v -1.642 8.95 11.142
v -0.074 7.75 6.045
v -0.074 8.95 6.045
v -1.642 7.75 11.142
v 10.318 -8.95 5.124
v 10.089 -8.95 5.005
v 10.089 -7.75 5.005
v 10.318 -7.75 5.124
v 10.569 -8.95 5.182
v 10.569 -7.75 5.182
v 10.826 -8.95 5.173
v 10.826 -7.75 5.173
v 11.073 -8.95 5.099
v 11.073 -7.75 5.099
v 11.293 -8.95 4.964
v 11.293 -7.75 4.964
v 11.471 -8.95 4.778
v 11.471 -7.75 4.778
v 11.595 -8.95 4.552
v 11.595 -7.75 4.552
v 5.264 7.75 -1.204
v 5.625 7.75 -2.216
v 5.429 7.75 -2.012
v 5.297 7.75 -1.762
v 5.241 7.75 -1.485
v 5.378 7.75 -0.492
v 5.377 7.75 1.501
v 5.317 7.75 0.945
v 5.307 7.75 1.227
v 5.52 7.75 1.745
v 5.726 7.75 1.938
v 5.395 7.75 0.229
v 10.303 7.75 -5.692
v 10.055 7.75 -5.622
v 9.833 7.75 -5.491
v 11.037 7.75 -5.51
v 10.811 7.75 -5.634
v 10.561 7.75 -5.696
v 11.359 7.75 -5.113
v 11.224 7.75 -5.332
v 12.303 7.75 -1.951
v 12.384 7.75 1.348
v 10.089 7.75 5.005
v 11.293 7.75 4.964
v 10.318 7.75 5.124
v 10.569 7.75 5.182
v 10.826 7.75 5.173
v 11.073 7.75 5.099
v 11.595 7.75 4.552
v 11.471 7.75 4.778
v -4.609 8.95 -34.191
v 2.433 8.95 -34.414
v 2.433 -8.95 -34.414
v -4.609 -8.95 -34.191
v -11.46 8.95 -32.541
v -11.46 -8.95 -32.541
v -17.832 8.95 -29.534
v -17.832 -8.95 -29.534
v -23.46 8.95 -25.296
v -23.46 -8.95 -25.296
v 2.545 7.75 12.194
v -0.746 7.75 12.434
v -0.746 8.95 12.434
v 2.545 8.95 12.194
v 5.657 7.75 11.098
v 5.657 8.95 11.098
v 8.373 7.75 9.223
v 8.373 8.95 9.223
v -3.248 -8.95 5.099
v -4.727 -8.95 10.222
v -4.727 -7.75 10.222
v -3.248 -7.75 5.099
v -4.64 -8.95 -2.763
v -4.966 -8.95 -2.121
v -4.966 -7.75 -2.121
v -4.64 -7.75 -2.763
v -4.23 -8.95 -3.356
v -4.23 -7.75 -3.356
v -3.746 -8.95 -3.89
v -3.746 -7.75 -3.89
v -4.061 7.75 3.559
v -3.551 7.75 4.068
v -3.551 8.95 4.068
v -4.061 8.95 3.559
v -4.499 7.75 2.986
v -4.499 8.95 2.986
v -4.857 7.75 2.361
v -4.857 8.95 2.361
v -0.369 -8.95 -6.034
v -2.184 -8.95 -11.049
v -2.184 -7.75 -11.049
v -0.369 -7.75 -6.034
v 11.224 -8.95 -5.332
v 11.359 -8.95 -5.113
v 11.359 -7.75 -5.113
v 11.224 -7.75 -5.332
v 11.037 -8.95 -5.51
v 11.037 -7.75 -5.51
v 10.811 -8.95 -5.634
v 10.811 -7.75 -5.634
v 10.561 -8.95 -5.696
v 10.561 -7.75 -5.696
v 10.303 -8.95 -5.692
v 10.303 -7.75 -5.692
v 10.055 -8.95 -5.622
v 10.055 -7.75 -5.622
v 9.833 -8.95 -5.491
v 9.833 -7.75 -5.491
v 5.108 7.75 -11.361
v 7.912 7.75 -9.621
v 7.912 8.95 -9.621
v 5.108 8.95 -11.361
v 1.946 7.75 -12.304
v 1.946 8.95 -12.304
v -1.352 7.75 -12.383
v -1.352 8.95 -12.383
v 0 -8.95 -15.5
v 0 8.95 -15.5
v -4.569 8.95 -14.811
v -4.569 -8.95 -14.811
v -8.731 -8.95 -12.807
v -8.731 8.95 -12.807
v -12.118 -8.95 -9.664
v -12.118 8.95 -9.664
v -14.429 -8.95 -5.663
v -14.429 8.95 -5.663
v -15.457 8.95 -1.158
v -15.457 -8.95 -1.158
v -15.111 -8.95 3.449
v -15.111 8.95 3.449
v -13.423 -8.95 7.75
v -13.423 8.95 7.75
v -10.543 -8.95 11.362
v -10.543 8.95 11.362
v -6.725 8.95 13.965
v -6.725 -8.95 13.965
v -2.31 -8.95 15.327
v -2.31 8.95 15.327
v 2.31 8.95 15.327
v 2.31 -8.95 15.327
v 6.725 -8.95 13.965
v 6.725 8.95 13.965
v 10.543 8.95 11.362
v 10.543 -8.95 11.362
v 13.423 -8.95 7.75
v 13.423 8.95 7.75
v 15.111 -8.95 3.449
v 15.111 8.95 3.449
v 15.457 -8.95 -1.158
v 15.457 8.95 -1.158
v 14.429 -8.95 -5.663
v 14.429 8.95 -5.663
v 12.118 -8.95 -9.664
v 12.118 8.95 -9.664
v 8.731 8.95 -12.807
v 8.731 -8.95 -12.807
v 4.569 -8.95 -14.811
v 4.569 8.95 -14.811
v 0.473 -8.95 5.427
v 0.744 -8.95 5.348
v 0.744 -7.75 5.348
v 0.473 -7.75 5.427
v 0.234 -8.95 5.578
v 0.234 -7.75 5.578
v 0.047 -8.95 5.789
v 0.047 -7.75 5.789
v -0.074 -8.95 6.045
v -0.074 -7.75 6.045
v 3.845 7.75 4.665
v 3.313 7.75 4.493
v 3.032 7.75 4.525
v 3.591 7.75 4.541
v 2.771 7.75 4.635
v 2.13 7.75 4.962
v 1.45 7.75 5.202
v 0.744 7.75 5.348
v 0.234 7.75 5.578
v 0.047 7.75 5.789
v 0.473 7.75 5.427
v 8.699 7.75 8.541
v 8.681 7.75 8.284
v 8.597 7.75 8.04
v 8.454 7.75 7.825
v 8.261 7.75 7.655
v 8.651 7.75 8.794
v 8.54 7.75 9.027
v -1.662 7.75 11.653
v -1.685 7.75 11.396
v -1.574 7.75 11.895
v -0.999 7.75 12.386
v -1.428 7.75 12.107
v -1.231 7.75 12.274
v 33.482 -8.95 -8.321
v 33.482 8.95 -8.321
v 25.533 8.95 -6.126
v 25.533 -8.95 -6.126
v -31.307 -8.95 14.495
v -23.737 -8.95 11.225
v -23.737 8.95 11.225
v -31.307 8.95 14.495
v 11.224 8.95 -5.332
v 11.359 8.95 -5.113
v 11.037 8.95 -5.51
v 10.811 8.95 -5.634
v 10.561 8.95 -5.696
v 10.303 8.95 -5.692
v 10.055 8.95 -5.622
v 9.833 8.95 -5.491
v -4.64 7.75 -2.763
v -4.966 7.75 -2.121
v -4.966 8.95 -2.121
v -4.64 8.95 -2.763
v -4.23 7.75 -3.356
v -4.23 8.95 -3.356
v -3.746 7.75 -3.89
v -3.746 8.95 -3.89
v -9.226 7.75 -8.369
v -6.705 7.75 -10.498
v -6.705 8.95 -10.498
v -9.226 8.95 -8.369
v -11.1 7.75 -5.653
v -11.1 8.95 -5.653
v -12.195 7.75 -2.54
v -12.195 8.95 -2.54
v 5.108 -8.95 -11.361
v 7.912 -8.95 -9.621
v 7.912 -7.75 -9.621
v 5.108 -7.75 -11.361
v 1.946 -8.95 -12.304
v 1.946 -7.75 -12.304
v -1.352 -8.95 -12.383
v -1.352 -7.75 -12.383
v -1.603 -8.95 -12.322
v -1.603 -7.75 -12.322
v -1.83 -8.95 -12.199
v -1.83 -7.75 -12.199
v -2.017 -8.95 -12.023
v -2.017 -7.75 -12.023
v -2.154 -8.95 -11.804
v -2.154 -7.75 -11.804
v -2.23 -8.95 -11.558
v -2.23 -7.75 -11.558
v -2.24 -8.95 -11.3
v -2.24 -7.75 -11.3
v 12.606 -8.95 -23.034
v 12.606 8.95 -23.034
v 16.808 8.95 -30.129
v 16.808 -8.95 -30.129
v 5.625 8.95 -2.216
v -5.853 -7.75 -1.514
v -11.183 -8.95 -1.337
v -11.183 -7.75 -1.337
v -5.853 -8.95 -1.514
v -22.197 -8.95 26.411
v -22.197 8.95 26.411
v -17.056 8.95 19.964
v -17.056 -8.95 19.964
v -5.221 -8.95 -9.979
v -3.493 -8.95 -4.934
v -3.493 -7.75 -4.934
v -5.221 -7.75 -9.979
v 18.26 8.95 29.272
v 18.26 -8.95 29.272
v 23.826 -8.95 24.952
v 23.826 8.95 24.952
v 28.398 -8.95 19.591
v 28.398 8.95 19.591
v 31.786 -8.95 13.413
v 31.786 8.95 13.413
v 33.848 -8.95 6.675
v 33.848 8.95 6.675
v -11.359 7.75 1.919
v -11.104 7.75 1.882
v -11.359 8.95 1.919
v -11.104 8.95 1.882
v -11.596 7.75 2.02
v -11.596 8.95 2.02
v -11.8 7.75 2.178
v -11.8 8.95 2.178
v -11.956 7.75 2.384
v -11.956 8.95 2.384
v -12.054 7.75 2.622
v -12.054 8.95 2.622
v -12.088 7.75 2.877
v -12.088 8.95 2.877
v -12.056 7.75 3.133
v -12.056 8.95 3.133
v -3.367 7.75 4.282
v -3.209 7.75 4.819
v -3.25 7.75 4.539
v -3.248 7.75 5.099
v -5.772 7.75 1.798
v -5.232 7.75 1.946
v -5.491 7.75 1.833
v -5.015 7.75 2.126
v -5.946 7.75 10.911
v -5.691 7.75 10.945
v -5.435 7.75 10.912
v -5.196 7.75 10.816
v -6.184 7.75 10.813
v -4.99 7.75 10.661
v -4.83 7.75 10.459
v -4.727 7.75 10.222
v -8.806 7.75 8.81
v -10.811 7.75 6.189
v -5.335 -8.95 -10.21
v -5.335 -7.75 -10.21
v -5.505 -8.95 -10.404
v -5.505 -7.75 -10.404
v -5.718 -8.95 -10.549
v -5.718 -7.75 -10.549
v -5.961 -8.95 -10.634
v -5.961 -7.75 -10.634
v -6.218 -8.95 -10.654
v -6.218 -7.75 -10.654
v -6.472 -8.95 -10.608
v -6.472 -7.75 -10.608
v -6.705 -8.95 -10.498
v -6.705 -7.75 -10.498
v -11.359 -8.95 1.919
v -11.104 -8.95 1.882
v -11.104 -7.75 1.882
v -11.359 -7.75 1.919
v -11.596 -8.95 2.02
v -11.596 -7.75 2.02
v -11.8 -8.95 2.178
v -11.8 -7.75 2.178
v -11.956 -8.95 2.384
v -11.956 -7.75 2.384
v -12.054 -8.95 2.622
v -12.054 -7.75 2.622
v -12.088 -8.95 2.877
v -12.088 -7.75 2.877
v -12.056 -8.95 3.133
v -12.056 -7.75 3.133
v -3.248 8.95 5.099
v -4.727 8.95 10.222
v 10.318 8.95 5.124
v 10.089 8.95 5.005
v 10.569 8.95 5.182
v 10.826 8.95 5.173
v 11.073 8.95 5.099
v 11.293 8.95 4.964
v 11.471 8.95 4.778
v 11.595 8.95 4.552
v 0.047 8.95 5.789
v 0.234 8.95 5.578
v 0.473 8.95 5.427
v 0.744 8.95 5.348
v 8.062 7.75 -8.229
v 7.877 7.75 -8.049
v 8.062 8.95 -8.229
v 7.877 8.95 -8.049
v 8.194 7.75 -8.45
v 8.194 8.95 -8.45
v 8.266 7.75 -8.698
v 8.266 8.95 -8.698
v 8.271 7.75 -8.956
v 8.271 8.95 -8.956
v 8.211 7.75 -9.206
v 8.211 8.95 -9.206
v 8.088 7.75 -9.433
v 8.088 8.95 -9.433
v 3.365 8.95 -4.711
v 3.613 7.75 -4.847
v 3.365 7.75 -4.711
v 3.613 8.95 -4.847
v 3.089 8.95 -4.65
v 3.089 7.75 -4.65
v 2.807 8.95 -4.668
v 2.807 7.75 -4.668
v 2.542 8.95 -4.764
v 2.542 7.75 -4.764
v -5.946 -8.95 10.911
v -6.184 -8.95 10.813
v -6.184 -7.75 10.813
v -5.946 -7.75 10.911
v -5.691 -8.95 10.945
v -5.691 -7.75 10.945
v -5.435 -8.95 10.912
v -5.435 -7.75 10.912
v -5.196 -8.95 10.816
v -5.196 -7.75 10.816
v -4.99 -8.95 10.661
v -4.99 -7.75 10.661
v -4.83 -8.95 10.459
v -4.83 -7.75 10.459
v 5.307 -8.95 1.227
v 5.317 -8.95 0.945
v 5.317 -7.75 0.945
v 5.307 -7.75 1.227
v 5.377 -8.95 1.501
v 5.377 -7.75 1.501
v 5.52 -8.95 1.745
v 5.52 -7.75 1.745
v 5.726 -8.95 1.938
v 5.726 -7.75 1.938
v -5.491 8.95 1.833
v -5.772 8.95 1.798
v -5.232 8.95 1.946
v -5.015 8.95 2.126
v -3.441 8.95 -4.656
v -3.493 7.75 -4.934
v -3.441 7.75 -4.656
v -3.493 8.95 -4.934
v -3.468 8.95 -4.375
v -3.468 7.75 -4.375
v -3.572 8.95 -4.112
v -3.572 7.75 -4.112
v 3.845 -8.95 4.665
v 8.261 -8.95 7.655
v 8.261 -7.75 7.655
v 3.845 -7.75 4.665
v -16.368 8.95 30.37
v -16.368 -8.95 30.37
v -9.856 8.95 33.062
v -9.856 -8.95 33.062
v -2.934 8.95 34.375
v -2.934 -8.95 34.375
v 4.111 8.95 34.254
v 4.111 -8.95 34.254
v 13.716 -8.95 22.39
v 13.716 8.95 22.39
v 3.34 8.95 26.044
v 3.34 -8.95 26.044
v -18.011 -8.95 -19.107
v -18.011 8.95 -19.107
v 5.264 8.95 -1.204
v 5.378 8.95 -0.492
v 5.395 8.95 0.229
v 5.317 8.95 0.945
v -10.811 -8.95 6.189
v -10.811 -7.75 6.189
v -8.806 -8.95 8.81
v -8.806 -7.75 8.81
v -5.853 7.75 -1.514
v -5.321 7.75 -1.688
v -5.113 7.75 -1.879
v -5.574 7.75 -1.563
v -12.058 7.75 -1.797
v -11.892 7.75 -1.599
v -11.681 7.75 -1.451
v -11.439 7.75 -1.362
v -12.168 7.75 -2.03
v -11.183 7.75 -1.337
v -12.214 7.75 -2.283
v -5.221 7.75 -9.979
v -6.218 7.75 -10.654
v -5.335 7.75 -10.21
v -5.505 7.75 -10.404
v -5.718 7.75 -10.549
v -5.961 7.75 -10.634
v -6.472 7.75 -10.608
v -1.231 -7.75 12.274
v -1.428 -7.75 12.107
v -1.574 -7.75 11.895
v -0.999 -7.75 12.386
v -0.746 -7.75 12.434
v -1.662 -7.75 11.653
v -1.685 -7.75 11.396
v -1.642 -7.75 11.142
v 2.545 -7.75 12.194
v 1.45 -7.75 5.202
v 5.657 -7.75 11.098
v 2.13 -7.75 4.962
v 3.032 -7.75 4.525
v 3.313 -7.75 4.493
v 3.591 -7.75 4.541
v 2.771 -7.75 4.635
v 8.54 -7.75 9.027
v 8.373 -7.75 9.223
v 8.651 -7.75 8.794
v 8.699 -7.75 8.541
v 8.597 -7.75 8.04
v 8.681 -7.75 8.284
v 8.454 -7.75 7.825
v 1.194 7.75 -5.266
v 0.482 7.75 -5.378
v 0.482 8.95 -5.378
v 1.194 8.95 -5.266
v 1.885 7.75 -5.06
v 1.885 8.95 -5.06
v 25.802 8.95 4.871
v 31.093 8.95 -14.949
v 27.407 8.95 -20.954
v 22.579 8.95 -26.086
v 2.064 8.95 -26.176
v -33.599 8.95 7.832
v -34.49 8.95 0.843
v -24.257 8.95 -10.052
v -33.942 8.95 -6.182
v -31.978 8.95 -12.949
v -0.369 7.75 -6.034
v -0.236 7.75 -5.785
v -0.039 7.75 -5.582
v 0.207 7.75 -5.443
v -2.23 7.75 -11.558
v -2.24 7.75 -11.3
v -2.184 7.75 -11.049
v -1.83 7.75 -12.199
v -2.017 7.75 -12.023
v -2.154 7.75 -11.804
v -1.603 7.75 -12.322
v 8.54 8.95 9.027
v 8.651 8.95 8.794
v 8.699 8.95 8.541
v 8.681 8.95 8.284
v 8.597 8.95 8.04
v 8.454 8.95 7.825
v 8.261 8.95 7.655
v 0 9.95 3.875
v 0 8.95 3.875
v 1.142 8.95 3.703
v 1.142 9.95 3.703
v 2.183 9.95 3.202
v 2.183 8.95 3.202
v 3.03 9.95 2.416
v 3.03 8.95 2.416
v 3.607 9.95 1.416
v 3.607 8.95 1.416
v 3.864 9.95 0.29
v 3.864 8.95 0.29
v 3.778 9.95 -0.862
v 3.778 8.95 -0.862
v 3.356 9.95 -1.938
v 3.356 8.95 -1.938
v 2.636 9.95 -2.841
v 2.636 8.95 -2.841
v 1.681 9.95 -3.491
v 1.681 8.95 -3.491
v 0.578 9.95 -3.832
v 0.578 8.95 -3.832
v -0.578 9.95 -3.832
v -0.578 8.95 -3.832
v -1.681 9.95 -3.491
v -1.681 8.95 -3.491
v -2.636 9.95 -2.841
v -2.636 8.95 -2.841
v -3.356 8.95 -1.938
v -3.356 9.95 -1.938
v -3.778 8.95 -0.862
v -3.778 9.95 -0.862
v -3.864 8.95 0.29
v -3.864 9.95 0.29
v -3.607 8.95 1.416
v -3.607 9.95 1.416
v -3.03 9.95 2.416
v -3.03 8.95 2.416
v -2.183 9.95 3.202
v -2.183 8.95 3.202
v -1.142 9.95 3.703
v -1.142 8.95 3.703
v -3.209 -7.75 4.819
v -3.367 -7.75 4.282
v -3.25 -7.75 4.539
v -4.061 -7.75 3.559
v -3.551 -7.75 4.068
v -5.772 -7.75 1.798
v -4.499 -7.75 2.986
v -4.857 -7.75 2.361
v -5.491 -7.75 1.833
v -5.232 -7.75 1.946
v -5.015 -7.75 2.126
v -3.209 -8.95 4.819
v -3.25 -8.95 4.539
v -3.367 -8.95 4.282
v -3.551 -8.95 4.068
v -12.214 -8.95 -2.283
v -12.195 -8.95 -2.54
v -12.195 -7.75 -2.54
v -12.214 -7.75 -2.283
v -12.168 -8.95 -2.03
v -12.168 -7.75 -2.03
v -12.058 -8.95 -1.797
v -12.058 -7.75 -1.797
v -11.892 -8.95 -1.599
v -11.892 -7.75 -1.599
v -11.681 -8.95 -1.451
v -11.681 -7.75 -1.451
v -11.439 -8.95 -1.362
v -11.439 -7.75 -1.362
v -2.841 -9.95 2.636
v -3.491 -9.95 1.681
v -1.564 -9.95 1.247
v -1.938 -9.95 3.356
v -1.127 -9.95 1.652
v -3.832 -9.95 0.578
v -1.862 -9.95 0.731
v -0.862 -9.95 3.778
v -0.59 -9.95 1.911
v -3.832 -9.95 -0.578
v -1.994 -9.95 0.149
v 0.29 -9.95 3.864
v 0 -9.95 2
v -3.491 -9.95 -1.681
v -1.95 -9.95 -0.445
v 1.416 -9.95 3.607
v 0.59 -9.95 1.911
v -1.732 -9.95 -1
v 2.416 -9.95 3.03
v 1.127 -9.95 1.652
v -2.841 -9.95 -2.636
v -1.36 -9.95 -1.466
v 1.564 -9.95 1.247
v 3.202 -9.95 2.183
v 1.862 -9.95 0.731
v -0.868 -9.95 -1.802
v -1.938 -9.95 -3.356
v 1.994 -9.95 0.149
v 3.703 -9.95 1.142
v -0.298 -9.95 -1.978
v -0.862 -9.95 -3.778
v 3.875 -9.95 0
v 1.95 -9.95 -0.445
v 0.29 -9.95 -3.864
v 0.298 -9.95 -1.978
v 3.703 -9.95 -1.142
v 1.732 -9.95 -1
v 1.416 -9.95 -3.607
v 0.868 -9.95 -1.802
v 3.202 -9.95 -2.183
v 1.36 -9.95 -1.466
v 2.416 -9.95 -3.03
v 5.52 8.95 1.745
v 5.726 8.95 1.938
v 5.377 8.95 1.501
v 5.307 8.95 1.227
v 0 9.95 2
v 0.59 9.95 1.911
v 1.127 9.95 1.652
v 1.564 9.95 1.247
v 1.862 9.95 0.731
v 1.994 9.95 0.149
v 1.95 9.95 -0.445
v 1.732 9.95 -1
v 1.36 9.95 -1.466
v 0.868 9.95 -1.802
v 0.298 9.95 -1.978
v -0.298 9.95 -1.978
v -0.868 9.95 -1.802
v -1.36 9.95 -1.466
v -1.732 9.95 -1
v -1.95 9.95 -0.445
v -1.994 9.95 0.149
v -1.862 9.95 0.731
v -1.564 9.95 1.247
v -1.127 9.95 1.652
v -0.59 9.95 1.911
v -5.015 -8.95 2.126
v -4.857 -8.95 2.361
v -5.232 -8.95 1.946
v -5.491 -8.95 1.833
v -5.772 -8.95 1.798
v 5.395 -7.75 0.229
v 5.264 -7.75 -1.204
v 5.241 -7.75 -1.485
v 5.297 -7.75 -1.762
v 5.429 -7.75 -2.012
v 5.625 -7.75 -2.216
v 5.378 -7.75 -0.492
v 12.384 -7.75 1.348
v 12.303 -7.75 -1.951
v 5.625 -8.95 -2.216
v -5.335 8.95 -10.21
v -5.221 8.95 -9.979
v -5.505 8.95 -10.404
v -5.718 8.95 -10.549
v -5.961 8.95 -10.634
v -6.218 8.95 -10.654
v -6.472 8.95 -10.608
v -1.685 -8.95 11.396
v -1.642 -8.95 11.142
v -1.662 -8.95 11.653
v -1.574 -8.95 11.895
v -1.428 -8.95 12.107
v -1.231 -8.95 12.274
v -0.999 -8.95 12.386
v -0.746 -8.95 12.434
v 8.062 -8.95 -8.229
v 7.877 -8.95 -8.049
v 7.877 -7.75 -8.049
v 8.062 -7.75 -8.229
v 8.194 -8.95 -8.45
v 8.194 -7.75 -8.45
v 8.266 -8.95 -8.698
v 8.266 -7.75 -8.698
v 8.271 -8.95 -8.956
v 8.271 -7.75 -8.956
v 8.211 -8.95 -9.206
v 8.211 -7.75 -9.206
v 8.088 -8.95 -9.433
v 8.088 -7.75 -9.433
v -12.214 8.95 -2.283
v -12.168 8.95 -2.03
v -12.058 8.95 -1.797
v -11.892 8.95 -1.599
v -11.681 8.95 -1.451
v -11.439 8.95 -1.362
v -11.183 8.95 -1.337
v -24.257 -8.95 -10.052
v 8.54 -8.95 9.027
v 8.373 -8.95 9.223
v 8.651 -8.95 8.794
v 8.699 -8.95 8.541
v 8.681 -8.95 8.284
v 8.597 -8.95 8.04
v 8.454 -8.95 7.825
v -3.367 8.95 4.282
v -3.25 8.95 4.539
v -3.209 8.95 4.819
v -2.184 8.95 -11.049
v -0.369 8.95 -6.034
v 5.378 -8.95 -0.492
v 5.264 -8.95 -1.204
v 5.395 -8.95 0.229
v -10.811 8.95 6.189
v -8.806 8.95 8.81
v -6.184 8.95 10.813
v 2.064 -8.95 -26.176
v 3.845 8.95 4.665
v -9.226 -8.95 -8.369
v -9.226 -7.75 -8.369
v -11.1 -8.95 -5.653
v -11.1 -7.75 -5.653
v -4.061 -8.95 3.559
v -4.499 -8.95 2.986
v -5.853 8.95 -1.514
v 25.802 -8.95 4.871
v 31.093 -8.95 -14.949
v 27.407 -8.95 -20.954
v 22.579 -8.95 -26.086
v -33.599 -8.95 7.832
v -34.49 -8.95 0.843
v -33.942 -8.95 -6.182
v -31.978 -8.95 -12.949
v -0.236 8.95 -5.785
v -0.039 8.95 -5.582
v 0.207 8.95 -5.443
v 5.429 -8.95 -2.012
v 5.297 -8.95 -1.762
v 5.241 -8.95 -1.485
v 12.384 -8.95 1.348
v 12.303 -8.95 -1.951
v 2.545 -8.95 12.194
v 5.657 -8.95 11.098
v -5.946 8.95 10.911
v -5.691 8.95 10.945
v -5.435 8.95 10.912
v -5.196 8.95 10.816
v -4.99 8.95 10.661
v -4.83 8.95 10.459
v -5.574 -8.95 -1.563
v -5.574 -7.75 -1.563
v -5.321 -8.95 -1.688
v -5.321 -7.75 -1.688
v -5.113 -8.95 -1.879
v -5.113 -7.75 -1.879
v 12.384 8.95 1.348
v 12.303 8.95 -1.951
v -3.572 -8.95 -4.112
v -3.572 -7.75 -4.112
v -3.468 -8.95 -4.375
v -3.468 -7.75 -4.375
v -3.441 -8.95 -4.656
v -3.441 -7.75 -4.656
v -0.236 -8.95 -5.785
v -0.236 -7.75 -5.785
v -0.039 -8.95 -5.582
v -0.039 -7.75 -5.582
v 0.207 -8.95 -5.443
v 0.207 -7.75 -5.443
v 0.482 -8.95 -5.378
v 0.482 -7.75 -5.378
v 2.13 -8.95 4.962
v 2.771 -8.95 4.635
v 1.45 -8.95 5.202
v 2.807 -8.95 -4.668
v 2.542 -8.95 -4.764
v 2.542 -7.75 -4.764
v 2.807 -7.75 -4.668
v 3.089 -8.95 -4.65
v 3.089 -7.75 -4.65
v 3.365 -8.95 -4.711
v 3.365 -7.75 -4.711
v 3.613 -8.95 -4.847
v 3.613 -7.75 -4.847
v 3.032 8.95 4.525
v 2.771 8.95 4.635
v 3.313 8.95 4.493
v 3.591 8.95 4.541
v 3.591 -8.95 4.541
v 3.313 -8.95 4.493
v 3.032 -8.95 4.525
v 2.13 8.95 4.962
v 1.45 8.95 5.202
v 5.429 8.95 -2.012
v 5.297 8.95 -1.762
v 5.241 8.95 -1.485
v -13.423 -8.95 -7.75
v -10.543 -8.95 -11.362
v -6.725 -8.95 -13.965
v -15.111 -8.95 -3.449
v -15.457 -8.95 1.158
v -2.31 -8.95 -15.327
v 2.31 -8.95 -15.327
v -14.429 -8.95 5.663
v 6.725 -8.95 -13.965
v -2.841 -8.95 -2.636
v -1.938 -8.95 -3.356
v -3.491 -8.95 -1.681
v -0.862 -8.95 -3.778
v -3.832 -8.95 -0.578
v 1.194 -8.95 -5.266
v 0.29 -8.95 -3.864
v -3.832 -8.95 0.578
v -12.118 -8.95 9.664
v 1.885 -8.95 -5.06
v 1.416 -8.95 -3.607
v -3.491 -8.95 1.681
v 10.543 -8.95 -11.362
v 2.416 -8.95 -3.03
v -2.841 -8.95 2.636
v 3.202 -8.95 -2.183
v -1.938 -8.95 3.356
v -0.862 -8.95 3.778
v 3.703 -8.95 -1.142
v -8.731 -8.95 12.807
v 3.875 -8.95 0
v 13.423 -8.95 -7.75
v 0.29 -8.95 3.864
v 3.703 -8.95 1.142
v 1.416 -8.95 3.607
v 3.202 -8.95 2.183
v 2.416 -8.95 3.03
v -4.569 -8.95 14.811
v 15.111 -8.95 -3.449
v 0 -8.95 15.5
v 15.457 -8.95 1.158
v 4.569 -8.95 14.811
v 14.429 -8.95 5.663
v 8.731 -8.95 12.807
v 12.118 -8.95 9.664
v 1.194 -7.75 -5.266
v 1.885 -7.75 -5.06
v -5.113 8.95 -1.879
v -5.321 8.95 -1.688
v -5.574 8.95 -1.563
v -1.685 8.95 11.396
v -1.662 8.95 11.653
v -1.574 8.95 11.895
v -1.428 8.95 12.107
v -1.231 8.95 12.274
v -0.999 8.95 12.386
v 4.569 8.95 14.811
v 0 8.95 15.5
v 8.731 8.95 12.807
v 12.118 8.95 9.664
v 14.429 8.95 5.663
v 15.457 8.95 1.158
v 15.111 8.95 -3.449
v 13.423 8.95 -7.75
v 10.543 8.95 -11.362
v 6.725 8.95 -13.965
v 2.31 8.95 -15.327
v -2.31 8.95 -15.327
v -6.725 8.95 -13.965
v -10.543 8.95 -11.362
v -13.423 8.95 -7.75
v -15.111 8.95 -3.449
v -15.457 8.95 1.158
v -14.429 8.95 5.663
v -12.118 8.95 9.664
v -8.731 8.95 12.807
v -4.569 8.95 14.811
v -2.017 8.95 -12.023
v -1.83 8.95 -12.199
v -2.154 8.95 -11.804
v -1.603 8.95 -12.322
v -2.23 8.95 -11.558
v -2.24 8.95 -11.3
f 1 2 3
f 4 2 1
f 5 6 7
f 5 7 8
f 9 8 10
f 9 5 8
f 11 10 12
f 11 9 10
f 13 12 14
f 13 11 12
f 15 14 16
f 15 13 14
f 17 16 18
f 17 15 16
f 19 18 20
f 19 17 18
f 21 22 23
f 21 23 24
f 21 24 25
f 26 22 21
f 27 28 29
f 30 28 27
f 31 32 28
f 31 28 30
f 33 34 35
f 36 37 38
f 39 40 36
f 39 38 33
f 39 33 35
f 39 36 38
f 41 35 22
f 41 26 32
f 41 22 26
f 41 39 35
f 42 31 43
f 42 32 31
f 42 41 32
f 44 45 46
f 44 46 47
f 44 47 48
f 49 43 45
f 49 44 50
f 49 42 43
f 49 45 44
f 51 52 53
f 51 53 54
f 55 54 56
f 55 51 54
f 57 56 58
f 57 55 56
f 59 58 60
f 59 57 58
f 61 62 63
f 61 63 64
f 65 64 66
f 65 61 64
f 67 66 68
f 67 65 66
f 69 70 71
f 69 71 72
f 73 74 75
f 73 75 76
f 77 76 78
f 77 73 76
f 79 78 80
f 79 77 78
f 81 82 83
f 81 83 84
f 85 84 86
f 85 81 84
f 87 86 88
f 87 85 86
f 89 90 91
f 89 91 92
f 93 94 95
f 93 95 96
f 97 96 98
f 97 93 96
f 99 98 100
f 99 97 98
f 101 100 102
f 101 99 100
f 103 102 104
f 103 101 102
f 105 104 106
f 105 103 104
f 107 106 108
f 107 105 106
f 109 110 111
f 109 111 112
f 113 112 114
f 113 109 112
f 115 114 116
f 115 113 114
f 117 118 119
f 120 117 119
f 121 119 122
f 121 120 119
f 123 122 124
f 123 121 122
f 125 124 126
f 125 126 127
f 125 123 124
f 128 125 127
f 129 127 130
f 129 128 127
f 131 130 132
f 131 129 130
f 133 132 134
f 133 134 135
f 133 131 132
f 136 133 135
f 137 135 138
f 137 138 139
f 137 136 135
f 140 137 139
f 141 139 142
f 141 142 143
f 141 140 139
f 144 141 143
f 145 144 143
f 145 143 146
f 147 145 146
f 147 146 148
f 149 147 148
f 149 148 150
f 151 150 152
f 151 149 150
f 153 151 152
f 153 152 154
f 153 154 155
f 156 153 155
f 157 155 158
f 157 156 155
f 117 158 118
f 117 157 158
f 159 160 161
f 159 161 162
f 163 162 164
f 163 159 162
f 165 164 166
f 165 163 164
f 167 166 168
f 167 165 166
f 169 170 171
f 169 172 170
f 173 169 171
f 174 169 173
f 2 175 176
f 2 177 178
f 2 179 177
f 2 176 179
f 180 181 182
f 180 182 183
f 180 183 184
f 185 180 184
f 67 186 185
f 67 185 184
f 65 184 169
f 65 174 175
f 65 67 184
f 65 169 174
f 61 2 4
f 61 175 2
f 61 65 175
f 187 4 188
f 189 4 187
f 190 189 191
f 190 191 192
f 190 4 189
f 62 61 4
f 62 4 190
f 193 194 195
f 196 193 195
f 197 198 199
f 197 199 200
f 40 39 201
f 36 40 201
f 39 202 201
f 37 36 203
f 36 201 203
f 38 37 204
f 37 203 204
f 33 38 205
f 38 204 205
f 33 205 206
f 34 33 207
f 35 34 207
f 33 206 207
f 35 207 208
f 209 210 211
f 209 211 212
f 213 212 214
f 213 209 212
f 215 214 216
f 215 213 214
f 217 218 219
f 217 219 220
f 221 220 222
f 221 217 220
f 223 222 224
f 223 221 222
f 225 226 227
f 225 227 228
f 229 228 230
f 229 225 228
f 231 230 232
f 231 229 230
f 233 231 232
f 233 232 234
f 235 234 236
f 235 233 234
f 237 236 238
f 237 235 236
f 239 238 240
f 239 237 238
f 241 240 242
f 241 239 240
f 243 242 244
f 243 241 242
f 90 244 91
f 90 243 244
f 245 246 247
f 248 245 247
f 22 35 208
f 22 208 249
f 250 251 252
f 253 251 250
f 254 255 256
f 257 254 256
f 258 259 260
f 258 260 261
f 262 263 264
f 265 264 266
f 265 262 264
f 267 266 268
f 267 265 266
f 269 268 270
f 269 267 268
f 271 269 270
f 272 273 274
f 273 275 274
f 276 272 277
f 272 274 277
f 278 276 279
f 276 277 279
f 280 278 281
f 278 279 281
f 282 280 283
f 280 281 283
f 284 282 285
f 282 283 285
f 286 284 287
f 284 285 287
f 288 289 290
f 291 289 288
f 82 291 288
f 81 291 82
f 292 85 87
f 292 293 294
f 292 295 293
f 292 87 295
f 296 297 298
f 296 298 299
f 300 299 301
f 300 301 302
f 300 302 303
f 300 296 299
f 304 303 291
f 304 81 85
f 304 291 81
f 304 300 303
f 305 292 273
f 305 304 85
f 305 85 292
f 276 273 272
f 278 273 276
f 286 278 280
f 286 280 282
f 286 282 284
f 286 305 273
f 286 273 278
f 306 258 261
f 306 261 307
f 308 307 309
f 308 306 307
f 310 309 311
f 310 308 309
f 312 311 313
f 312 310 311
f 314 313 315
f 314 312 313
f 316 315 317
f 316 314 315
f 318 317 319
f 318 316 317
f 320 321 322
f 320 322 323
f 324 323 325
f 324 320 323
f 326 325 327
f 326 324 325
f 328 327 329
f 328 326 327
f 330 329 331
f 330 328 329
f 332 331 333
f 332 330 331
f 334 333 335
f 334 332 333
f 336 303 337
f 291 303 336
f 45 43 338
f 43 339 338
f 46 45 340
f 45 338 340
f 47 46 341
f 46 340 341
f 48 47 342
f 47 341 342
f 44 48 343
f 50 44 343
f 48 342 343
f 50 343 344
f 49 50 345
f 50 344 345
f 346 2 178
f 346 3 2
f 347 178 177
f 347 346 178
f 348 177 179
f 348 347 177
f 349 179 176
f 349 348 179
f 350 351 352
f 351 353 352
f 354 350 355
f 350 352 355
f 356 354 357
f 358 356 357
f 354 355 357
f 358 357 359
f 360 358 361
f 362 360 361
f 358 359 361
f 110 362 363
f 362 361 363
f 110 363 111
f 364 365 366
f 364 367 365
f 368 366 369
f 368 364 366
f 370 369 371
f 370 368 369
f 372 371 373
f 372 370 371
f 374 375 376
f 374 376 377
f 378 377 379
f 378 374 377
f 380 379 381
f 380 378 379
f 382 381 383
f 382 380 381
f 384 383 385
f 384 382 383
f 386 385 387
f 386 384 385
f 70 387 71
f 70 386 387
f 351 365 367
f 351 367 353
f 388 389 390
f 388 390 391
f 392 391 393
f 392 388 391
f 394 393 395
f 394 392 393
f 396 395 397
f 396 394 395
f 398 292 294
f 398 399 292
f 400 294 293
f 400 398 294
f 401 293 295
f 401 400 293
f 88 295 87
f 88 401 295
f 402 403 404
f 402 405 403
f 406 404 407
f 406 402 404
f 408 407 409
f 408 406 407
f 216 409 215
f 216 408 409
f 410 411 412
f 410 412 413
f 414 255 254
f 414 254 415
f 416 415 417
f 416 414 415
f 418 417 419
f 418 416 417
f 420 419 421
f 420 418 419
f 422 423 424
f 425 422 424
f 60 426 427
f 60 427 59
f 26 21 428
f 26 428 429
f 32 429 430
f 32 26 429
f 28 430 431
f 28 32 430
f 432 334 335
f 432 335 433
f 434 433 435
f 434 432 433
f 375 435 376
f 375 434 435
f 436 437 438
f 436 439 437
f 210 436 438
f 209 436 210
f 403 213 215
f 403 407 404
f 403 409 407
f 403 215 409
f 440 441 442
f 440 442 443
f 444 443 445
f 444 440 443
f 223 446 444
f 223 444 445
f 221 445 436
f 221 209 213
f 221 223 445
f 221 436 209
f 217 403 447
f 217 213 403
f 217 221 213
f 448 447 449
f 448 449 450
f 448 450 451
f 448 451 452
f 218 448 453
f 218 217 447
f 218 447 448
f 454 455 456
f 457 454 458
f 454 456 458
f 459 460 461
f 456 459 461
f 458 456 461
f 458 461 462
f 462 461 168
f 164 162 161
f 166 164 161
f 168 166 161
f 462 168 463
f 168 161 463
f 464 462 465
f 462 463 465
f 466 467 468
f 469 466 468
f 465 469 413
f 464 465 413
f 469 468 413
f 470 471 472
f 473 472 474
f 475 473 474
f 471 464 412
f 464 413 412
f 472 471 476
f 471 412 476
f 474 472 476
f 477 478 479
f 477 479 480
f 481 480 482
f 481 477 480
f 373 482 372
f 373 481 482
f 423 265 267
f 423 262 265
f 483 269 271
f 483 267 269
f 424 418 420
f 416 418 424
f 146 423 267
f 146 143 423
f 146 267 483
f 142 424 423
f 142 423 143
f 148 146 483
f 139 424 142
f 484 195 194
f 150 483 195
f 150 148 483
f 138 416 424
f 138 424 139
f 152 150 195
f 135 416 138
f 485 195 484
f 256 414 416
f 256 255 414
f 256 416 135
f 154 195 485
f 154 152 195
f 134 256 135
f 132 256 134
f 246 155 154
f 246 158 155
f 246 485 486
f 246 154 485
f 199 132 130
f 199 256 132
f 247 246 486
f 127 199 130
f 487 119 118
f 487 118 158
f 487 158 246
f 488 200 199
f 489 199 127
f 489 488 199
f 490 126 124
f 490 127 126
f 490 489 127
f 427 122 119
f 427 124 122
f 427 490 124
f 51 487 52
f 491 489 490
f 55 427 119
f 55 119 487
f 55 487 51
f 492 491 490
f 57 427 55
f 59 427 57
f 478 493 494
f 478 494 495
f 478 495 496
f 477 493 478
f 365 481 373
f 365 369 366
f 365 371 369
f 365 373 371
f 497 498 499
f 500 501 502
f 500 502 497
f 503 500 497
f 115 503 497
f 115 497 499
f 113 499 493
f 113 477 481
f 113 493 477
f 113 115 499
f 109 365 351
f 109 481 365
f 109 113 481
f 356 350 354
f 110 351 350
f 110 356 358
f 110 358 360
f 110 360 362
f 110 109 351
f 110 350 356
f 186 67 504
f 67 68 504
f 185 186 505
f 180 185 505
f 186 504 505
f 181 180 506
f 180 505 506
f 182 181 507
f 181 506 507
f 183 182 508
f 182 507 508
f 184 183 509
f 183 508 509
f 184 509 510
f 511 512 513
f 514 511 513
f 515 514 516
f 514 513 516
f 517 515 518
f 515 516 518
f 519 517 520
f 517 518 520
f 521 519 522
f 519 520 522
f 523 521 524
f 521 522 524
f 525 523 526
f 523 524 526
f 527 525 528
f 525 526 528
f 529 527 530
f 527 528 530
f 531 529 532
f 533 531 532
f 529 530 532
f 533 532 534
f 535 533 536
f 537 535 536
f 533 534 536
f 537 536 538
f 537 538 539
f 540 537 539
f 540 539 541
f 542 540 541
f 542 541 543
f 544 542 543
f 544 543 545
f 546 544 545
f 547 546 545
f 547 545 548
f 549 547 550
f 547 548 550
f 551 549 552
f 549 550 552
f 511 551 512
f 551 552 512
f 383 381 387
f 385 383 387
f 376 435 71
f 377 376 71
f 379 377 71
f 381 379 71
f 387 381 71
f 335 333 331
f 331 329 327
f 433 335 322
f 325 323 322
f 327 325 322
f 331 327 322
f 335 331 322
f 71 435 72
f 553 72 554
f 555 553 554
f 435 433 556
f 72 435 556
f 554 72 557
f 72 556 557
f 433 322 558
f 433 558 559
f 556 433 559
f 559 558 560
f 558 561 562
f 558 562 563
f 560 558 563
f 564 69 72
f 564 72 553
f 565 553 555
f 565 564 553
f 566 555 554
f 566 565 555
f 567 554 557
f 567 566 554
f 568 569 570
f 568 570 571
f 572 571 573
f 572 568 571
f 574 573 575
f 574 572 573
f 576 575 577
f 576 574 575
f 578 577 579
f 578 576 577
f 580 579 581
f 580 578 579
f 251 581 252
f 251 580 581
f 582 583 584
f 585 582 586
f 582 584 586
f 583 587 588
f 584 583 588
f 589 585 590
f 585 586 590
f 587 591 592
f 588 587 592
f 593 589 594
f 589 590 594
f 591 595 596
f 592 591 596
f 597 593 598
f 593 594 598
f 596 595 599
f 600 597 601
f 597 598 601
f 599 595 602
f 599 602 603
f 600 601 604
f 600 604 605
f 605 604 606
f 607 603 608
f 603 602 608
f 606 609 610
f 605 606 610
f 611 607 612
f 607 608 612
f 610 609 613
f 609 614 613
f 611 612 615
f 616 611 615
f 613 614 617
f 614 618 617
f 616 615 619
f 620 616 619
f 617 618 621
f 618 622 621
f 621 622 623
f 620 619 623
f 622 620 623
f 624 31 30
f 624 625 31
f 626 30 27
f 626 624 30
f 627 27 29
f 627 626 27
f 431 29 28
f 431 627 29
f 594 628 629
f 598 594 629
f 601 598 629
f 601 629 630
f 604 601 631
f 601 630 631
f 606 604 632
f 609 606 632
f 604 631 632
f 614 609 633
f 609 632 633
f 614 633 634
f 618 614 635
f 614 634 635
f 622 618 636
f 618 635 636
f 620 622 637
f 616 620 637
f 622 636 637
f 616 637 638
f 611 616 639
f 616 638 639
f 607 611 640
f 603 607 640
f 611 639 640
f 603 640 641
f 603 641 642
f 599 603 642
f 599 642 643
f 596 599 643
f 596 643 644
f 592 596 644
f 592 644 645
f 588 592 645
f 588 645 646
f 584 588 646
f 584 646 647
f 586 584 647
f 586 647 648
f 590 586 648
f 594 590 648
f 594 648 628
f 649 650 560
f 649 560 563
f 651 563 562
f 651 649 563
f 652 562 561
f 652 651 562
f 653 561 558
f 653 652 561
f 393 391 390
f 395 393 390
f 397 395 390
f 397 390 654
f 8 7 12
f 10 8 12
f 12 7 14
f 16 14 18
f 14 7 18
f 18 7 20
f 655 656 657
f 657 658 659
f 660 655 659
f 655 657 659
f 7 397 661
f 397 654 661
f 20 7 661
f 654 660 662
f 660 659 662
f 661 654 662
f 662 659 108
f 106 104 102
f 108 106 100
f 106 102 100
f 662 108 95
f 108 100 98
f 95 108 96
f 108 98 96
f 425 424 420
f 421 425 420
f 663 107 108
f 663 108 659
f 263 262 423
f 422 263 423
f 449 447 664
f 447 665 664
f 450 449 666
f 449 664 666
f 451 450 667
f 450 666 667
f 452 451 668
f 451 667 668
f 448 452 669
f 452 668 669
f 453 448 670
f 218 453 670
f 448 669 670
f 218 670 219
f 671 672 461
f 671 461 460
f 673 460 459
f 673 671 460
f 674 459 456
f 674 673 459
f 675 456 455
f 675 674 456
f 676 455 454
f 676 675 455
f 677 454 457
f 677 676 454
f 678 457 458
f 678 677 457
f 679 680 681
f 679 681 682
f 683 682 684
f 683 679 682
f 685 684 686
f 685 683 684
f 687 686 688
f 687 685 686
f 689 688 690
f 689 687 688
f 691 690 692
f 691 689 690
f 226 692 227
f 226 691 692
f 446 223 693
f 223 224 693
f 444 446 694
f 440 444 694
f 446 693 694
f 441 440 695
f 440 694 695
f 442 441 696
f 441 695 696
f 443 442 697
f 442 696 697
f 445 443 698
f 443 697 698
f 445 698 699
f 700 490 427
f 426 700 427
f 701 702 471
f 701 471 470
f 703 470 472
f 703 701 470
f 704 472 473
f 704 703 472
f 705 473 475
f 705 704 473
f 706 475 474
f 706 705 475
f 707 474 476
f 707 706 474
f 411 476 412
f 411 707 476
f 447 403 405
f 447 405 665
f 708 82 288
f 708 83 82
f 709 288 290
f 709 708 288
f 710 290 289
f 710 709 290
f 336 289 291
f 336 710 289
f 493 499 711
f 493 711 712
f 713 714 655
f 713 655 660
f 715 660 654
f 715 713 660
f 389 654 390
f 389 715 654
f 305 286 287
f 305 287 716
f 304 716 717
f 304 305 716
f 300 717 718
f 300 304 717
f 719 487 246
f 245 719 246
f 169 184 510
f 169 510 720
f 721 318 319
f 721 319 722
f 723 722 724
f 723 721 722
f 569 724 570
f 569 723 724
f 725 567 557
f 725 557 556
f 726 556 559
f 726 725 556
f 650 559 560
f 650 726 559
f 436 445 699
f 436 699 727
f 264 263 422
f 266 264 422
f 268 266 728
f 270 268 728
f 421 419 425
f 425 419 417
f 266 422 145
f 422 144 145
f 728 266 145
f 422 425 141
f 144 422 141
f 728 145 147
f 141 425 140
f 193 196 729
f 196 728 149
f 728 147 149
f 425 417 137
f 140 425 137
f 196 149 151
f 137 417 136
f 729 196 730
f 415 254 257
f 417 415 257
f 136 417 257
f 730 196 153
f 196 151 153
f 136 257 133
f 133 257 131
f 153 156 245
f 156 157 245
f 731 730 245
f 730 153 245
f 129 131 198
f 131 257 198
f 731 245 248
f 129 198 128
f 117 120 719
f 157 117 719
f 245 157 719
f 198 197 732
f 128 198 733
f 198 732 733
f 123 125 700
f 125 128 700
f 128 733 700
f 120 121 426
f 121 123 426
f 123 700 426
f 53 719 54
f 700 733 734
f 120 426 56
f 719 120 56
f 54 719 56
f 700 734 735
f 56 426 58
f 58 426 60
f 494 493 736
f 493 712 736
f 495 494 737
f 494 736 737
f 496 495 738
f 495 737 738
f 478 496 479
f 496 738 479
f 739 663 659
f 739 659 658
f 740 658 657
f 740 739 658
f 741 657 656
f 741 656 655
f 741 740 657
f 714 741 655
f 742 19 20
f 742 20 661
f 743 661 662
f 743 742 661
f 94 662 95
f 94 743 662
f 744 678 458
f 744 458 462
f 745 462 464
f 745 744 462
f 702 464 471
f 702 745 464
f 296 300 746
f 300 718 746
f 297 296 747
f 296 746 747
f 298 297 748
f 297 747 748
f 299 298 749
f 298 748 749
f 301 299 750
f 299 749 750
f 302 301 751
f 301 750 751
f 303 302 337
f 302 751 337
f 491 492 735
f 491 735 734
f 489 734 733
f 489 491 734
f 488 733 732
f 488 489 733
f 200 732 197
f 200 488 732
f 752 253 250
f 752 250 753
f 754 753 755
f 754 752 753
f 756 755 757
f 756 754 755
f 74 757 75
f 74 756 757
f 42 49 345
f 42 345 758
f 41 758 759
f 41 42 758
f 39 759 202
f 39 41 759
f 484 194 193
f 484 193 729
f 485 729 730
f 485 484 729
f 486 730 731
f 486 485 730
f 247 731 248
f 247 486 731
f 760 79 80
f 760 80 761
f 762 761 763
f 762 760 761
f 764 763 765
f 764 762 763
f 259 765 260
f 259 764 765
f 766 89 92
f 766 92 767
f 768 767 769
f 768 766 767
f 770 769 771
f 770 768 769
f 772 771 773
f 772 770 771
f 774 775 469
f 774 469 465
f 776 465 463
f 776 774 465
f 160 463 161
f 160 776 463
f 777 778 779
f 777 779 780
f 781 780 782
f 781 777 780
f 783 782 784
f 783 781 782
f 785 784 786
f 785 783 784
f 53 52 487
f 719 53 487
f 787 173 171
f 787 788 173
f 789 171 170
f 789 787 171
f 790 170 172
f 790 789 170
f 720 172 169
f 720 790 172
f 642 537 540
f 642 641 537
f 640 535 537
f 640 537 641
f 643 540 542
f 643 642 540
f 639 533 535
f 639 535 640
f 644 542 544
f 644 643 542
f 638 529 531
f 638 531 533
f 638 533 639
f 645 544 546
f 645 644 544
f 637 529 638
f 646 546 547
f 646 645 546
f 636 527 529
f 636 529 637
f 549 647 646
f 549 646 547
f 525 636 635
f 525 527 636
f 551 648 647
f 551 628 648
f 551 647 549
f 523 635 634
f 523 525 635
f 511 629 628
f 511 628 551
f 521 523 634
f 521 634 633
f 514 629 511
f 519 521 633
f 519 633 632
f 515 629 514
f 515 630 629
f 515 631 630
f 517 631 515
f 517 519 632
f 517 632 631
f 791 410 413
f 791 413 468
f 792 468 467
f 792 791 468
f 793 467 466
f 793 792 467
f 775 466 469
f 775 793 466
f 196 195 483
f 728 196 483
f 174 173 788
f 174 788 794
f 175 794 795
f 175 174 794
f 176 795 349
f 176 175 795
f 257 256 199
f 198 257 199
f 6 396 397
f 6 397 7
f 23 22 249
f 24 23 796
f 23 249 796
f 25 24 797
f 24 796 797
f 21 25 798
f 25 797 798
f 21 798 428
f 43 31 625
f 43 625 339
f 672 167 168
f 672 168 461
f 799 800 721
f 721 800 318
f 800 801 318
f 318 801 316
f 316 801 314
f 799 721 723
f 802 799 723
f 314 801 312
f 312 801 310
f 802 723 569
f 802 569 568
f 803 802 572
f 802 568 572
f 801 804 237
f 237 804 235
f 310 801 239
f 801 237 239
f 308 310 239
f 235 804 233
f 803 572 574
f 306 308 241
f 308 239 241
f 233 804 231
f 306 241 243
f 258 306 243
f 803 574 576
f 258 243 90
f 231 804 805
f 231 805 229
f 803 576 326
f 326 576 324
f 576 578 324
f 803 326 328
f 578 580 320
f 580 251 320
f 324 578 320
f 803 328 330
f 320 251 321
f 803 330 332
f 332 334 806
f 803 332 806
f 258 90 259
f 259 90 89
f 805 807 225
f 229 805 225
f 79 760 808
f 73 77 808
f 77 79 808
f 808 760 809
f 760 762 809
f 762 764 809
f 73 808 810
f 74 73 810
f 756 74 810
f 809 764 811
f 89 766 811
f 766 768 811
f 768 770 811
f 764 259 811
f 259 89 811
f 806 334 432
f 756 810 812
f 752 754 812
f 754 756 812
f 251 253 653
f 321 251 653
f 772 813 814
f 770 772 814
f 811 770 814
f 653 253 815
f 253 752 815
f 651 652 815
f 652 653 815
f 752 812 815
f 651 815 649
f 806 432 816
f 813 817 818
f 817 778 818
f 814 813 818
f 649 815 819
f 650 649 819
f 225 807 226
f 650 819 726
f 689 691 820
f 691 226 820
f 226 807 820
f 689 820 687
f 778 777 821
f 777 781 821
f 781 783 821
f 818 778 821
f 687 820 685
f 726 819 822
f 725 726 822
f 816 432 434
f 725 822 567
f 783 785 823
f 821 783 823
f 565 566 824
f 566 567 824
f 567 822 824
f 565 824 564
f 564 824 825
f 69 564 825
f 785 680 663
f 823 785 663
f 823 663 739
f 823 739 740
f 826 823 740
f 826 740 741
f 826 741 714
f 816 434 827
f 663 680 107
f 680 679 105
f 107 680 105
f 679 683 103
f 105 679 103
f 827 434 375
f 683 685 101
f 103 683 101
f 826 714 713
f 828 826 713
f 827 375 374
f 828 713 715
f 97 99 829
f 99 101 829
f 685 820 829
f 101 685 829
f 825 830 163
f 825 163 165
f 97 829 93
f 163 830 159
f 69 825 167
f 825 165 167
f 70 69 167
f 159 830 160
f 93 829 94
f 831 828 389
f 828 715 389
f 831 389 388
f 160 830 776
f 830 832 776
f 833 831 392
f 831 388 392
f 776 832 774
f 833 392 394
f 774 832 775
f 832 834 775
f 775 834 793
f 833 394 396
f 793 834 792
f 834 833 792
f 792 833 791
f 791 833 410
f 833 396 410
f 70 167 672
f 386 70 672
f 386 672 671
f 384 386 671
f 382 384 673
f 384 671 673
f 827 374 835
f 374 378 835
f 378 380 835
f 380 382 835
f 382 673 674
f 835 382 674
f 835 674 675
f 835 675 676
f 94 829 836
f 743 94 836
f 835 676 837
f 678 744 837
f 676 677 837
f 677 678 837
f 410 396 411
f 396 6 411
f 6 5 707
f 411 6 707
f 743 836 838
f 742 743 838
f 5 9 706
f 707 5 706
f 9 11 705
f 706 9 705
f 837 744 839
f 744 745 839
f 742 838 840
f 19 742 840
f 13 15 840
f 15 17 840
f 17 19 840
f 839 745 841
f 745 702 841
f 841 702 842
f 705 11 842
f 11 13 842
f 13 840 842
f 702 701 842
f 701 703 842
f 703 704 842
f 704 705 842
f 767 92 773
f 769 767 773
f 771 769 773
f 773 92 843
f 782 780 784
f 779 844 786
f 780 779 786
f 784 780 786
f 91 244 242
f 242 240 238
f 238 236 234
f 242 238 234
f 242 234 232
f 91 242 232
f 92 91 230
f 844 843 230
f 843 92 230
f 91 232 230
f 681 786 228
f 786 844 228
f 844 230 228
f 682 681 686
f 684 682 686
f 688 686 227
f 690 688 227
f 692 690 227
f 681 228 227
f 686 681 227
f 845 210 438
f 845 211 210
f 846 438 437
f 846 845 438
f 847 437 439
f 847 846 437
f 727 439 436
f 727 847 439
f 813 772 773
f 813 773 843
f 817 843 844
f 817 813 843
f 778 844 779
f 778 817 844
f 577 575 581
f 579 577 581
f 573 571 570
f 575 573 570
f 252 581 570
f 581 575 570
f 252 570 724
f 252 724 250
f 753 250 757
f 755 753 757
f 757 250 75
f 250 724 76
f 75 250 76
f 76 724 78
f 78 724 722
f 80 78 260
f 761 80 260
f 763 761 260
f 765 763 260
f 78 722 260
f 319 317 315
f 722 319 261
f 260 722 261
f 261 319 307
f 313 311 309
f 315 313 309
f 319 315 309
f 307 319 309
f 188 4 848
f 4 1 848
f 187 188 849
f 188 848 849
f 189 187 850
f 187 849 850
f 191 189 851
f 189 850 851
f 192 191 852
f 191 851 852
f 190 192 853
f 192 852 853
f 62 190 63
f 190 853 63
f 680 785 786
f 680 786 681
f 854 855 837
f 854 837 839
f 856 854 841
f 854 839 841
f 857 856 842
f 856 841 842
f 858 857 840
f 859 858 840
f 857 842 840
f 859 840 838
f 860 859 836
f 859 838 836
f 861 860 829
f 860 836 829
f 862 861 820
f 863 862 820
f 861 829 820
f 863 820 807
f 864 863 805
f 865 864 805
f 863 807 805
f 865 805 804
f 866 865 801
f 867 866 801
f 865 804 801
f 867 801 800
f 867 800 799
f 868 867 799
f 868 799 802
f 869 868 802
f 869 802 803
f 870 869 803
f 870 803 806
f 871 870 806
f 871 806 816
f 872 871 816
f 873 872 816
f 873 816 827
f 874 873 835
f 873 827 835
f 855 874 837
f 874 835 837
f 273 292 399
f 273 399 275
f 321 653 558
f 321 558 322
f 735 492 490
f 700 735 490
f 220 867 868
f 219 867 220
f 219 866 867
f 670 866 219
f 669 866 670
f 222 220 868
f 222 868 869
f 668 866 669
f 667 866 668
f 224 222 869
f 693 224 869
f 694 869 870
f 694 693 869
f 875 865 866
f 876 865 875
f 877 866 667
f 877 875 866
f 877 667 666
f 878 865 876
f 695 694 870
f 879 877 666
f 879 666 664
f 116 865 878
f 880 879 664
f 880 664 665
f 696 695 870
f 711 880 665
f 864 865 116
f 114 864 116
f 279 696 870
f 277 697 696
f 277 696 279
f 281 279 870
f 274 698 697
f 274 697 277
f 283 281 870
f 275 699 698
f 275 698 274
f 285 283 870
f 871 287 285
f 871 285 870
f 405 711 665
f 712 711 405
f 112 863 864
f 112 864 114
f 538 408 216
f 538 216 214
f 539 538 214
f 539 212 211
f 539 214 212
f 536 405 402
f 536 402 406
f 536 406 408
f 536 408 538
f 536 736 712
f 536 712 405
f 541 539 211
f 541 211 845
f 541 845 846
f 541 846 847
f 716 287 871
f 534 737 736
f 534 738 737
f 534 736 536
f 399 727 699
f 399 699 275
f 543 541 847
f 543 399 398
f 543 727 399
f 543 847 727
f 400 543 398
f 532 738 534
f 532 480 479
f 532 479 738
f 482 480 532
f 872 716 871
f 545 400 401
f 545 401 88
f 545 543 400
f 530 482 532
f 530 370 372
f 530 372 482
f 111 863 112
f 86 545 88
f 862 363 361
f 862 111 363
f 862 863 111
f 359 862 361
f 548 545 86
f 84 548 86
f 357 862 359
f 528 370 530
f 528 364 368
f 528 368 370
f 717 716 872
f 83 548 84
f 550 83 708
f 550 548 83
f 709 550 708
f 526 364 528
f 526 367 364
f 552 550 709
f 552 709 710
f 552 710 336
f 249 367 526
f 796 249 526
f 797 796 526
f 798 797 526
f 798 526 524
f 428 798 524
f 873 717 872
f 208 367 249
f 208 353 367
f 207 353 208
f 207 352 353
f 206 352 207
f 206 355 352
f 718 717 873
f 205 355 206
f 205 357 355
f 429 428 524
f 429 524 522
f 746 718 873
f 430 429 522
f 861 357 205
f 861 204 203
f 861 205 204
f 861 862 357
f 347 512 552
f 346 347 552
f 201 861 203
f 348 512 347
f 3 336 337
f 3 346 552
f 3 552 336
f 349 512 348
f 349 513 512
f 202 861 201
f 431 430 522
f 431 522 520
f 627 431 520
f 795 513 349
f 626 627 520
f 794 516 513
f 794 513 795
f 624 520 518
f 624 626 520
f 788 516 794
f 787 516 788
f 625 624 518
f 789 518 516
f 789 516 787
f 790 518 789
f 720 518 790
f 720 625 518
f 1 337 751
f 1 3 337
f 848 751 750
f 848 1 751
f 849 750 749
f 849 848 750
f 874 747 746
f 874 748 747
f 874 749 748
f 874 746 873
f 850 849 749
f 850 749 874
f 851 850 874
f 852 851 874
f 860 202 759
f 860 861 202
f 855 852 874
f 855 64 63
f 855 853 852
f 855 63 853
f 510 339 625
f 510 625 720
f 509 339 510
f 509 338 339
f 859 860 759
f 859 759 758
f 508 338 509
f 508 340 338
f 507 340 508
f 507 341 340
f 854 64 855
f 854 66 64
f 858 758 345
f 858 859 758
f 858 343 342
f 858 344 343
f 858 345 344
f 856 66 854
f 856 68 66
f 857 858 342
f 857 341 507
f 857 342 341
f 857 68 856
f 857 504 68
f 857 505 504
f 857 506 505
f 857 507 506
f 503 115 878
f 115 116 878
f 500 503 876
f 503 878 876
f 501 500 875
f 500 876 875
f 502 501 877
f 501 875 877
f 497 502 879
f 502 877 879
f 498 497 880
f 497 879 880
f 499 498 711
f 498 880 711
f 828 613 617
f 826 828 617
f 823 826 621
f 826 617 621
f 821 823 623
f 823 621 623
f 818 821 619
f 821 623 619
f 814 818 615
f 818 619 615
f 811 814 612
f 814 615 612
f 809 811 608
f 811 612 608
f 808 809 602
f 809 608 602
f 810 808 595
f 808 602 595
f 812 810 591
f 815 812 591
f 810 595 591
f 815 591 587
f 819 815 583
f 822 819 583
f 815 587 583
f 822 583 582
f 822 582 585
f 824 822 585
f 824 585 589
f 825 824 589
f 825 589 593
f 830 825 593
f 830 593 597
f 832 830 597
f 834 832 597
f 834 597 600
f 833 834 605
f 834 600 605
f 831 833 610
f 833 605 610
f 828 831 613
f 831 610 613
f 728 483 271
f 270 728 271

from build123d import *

# Parameters (mm, degrees)
SKETCH1_R                = 34.5
SKETCH1_R_2              = 15.5
BOSS_EXTRUDE1_DEPTH      = 8.95
BOSS_EXTRUDE2_START      = -8.95
SKETCH2_R                = 15.5
BOSS_EXTRUDE2_DEPTH      = 17.9
SKETCH3_R                = 3.875
BOSS_EXTRUDE3_DEPTH      = 1
CUT_EXTRUDE1_START       = 7.75
CUT_EXTRUDE1_DEPTH       = 1.2
FILLET1_R                = 1
CIRPATTERN1_COUNT        = 5
FILLET1_OF_CIRPATTERN1_R = 1
MIRROR1_START            = -8.95
MIRROR1_DEPTH            = 1.2
MIRROR1_START_2          = -9.95
MIRROR1_2_OUTLINE_R      = 3.875
MIRROR1_2_DEPTH          = 1
SKETCH5_R                = 2
CUT_EXTRUDE2_DEPTH       = 53.692599101
CUT_EXTRUDE3_DEPTH       = 53.32313064
CIRPATTERN2_COUNT        = 5


# Read off the part's stored shape, not the designer's step: Cut-Extrude1, Mirror1
with BuildPart() as part:
    # Sketch1 → Boss-Extrude1 (new, symmetric)
    with BuildSketch(Plane(origin=(0, 0, 0), x_dir=(1, 0, 0), z_dir=(0, 1, 0))):
        with Locations(Location((0, 0, 0), (0, 0, 90))):
            Circle(SKETCH1_R)
        with Locations(Location((0, 0, 0), (0, 0, 90))):
            Circle(SKETCH1_R_2, mode=Mode.SUBTRACT)
    extrude(amount=BOSS_EXTRUDE1_DEPTH, both=True)

    # Sketch6 → Cut-Extrude3 (cut, symmetric)
    with BuildSketch(Plane(origin=(0, 8.95, 0), x_dir=(1, 0, 0), z_dir=(0, 1, 0))):
        with BuildLine():
            Line((2.433112603, 34.414095412), (2.064250813, 26.176138082))
            Line((2.064250813, 26.176138082), (12.605799132, 23.03356604))
            Line((12.605799132, 23.03356604), (16.80795122, 30.128769901))
            ThreePointArc((16.80795122, 30.128769901), (9.856248675, 33.062128819), (2.433112603, 34.414095412))
        make_face()
    cut_extrude3 = extrude(amount=CUT_EXTRUDE3_DEPTH, both=True, mode=Mode.SUBTRACT)

    # CirPattern2: Cut-Extrude3 ×5 about axis
    cirpattern2_axis = Axis((0, 0, 0), (0, 1, 0))
    for i in range(1, CIRPATTERN2_COUNT):
        add(cut_extrude3.rotate(cirpattern2_axis, i * 360 / CIRPATTERN2_COUNT), mode=Mode.SUBTRACT)


with BuildPart() as body_2:
    # Sketch2 → Boss-Extrude2 (new body)
    with BuildSketch(Plane(origin=(0, 0, 0), x_dir=(1, 0, 0), z_dir=(0, 1, 0)).offset(BOSS_EXTRUDE2_START)):
        with Locations(Location((0, 0, 0), (0, 0, 270))):
            Circle(SKETCH2_R)
    extrude(amount=BOSS_EXTRUDE2_DEPTH)

    # Sketch3 → Boss-Extrude3 (add)
    with BuildSketch(Plane(origin=(0, 8.95, 0), x_dir=(1, 0, 0), z_dir=(0, 1, 0))):
        with Locations(Location((0, 0, 0), (0, 0, 270))):
            Circle(SKETCH3_R)
    extrude(amount=BOSS_EXTRUDE3_DEPTH)

    # Cut-Extrude1 outline → Cut-Extrude1 (cut)
    with BuildSketch(Plane(origin=(0, 0, 0), x_dir=(1, 0, 0), z_dir=(0, 1, 0)).offset(CUT_EXTRUDE1_START)):
        with BuildLine():
            Line((3.071974537, 4.44105533), (8.842521572, 8.773704599))
            ThreePointArc((8.842521572, 8.773704599), (3.558719439, 11.93748701), (-2.59494852, 12.183362521))
            Line((-2.59494852, 12.183362521), (-0.138760092, 5.398216894))
            ThreePointArc((-0.138760092, 5.398216894), (1.542717184, 5.174941902), (3.071974537, 4.44105533))
        make_face()
    cut_extrude1 = extrude(amount=CUT_EXTRUDE1_DEPTH, mode=Mode.SUBTRACT)

    # Fillet1
    fillet1_edges = [body_2.edges().sort_by_distance(p)[0] for p in [
        (-2.59494852, 8.35, -12.183362521),
        (8.842521572, 8.35, -8.773704599),
        (3.071974537, 8.35, -4.44105533),
        (-0.138760092, 8.35, -5.398216894),
    ]]
    fillet(fillet1_edges, radius=FILLET1_R)

    # CirPattern1: Cut-Extrude1 ×5 about axis
    cirpattern1_axis = Axis((0, 0, 0), (0, 1, 0))
    for i in range(1, CIRPATTERN1_COUNT):
        add(cut_extrude1.rotate(cirpattern1_axis, i * 360 / CIRPATTERN1_COUNT), mode=Mode.SUBTRACT)

    # Fillet1 of CirPattern1
    fillet1_of_cirpattern1_edges = [body_2.edges().sort_by_distance(p)[0] for p in [
        (-12.388949508, 8.35, -1.296923368),
        (-5.611799492, 8.35, -11.120961586),
        (-3.274402273, 8.35, -4.293982971),
        (-5.17688858, 8.35, -1.53617207),
        (-5.061843361, 8.35, 11.381819799),
        (-12.310804396, 8.35, 1.900572351),
        (-5.095666434, 8.35, 1.787227907),
        (-3.060733006, 8.35, 4.448810342),
        (9.260558265, 8.35, 8.331274858),
        (-1.996696054, 8.35, 12.295579897),
        (0.125107221, 8.35, 5.398550563),
        (3.285251552, 8.35, 4.285688071),
        (10.785183124, 8.35, -6.232808767),
        (11.07677837, 8.35, 5.698513937),
        (5.172986949, 8.35, 1.549259831),
        (5.091130127, 8.35, -1.800109449),
    ]]
    fillet(fillet1_of_cirpattern1_edges, radius=FILLET1_OF_CIRPATTERN1_R)

    # Mirror1 outline → Mirror1 (cut)
    with BuildSketch(Plane(origin=(0, 0, 0), x_dir=(1, 0, 0), z_dir=(0, 1, 0)).offset(MIRROR1_START)):
        with BuildLine():
            ThreePointArc((7.912150219, 9.621120468), (3.558719439, 11.93748701), (-1.352433209, 12.383012742))
            ThreePointArc((-1.352433209, 12.383012742), (-2.092524389, 11.917859003), (-2.184150137, 11.048544516))
            Line((-2.184150137, 11.048544516), (-0.368934217, 6.034065893))
            ThreePointArc((-0.368934217, 6.034065893), (-0.03894228, 5.582272129), (0.482079862, 5.378438343))
            ThreePointArc((0.482079862, 5.378438343), (1.542717184, 5.174941902), (2.541647812, 4.764454471))
            ThreePointArc((2.541647812, 4.764454471), (3.089232431, 4.649722745), (3.612743558, 4.847076195))
            Line((3.612743558, 4.847076195), (7.87739554, 8.049067477))
            ThreePointArc((7.87739554, 8.049067477), (8.276731026, 8.826649707), (7.912150219, 9.621120468))
        make_face()
        with BuildLine():
            ThreePointArc((-0.745911268, -12.434295176), (4.137614309, -11.749392664), (8.372693719, -9.223127455))
            ThreePointArc((8.372693719, -9.223127455), (8.698029553, -8.411795494), (8.261186105, -7.654649037))
            Line((8.261186105, -7.654649037), (3.845208994, -4.664807761))
            ThreePointArc((3.845208994, -4.664807761), (3.312682197, -4.493263322), (2.771355937, -4.634607456))
            ThreePointArc((2.771355937, -4.634607456), (1.793670112, -5.093402353), (0.7442398, -5.348467736))
            ThreePointArc((0.7442398, -5.348467736), (0.233796921, -5.577509984), (-0.07373103, -6.044884399))
            Line((-0.07373103, -6.044884399), (-1.641823706, -11.142049303))
            ThreePointArc((-1.641823706, -11.142049303), (-1.507841533, -12.005850051), (-0.745911268, -12.434295176))
        make_face()
        with BuildLine():
            ThreePointArc((11.595218195, -4.551812294), (12.452929594, 0.304343044), (11.359020114, 5.112801795))
            ThreePointArc((11.359020114, 5.112801795), (10.687931868, 5.672929924), (9.832850747, 5.491438239))
            Line((9.832850747, 5.491438239), (5.624730745, 2.215506197))
            ThreePointArc((5.624730745, 2.215506197), (5.297022457, 1.762053264), (5.264169703, 1.203543657))
            ThreePointArc((5.264169703, 1.203543657), (5.398388045, 0.131933762), (5.316677838, -0.944953313))
            ThreePointArc((5.316677838, -0.944953313), (5.376774436, -1.501191286), (5.726242556, -1.938094385))
            Line((5.726242556, -1.938094385), (10.089367167, -5.004549721))
            ThreePointArc((10.089367167, -5.004549721), (10.952293266, -5.144054213), (11.595218195, -4.551812294))
        make_face()
        with BuildLine():
            ThreePointArc((-12.056216711, -3.133004751), (-9.895743318, -7.565867058), (-6.184410819, -10.813008045))
            ThreePointArc((-6.184410819, -10.813008045), (-5.312253969, -10.871705446), (-4.727156947, -10.222271516))
            Line((-4.727156947, -10.222271516), (-3.248260892, -5.098515944))
            ThreePointArc((-3.248260892, -5.098515944), (-3.249672266, -4.539042717), (-3.551377539, -4.067888589))
            ThreePointArc((-3.551377539, -4.067888589), (-4.289838951, -3.279829535), (-4.856712346, -2.360581535))
            ThreePointArc((-4.856712346, -2.360581535), (-5.232279993, -1.945899456), (-5.771810839, -1.797849632))
            Line((-5.771810839, -1.797849632), (-11.104070021, -1.881615453))
            ThreePointArc((-11.104070021, -1.881615453), (-11.884190583, -2.275969182), (-12.056216711, -3.133004751))
        make_face()
        with BuildLine():
            ThreePointArc((-6.705240435, 10.497991753), (-10.253520024, 7.073429668), (-12.194869805, 2.540320962))
            ThreePointArc((-12.194869805, 2.540320962), (-11.981183062, 1.692712013), (-11.182729768, 1.336937798))
            Line((-11.182729768, 1.336937798), (-5.85274463, 1.513751615))
            ThreePointArc((-5.85274463, 1.513751615), (-5.32109011, 1.687980646), (-4.966227963, 2.120514045))
            ThreePointArc((-4.966227963, 2.120514045), (-4.44493639, 3.066356223), (-3.745853103, 3.889548114))
            ThreePointArc((-3.745853103, 3.889548114), (-3.467523795, 4.374877982), (-3.493444245, 4.93375222))
            Line((-3.493444245, 4.93375222), (-5.220868981, 9.979146999))
            ThreePointArc((-5.220868981, 9.979146999), (-5.836992176, 10.599223739), (-6.705240435, 10.497991753))
        make_face()
    extrude(amount=MIRROR1_DEPTH, mode=Mode.SUBTRACT)

    # Mirror1 2 outline → Mirror1 2 (add)
    with BuildSketch(Plane(origin=(0, 0, 0), x_dir=(1, 0, 0), z_dir=(0, 1, 0)).offset(MIRROR1_START_2)):
        Circle(MIRROR1_2_OUTLINE_R)
    extrude(amount=MIRROR1_2_DEPTH)

    # Sketch5 → Cut-Extrude2 (cut, through all)
    with BuildSketch(Plane(origin=(0, 9.95, 0), x_dir=(1, 0, 0), z_dir=(0, 1, 0))):
        with Locations(Location((0, 0, 0), (0, 0, 270))):
            Circle(SKETCH5_R)
    extrude(amount=-CUT_EXTRUDE2_DEPTH, mode=Mode.SUBTRACT)


solid = Compound([part.part, body_2.part])
